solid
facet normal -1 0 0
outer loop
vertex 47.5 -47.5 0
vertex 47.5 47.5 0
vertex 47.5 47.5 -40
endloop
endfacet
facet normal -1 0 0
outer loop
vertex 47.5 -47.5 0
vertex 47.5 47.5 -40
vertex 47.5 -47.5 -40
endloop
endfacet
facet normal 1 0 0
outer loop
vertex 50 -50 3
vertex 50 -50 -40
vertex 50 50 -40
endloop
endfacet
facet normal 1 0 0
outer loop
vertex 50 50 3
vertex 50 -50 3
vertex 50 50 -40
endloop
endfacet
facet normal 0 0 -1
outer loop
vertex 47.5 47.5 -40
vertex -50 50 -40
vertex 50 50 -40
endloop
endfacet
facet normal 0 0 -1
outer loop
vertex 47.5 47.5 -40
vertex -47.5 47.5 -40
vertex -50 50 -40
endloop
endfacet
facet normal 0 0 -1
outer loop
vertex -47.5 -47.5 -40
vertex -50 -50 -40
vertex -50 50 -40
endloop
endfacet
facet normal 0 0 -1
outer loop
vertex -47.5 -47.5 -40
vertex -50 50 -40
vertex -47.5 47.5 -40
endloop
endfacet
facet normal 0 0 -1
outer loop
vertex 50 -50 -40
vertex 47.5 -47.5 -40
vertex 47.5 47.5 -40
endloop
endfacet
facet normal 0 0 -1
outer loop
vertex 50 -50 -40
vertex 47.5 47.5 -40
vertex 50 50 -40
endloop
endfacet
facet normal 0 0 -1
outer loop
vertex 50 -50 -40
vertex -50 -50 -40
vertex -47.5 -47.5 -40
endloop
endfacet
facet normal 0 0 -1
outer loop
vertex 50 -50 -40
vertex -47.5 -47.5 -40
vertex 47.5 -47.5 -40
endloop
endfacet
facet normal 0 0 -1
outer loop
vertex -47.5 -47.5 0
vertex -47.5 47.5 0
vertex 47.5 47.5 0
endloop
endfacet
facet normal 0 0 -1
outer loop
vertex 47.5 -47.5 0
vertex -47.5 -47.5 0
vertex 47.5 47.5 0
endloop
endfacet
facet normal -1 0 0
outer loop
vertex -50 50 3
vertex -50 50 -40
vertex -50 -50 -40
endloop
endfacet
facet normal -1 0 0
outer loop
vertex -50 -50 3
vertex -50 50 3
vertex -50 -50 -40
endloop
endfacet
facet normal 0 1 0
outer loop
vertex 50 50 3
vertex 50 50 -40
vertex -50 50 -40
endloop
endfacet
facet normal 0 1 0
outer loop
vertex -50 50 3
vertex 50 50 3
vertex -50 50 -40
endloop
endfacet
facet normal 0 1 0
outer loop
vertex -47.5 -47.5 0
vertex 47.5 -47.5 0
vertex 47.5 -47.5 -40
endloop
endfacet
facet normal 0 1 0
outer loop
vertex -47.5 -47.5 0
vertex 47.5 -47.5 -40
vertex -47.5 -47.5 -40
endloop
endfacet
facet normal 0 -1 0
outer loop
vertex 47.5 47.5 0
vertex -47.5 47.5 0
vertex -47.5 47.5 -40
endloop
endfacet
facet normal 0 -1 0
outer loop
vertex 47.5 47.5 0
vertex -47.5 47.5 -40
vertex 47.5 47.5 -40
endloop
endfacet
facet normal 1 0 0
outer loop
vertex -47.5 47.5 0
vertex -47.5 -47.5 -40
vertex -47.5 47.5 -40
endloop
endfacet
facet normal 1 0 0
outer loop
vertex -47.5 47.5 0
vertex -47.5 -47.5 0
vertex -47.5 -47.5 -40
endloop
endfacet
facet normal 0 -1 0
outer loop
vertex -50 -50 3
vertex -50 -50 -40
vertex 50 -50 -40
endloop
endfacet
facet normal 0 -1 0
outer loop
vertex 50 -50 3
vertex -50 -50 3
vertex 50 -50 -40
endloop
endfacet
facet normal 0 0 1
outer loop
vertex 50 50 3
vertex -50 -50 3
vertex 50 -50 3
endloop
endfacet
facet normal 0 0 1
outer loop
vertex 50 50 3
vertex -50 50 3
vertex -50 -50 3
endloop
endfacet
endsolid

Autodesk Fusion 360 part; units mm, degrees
sketch "base" plane through (0, 0, 0) normal (0, 0, 1) x (1, 0, 0) in component "base"
  line L0 (50, 50) -> (-50, 50)
  line L1 (-50, 50) -> (-50, -50)
  line L2 (-50, -50) -> (50, -50)
  line L3 (50, -50) -> (50, 50)
  line L4 (50, 50) -> (-50, -50) construction
  line L5 (-50, 50) -> (50, -50) construction
  dimension "d1" = 100
  dimension "d2" = 100
extrude "Extrude1" add sketch "base" along normal blind 3 in component "base"
sketch "legs" plane through (0, 0, 0) normal (0, 0, -1) x (1, 0, 0) in component "base"
  line L0 (50, -50) -> (50, 50)
  line L1 (50, 50) -> (-50, 50)
  line L2 (-50, 50) -> (-50, -50)
  line L3 (-50, -50) -> (50, -50)
  line L4 (47.5, 47.5) -> (-47.5, 47.5)
  line L5 (-47.5, 47.5) -> (-47.5, -47.5)
  line L6 (-47.5, -47.5) -> (47.5, -47.5)
  line L7 (47.5, -47.5) -> (47.5, 47.5)
  line L8 (47.5, 47.5) -> (-47.5, -47.5) construction
  line L9 (-47.5, 47.5) -> (47.5, -47.5) construction
  line L10 (-50, -50) -> (50, -50)
  line L11 (50, -50) -> (50, 50)
  line L12 (50, 50) -> (-50, 50)
  line L13 (-50, 50) -> (-50, -50)
  dimension "d5" = 95
  dimension "d6" = 95
  dimension "d7" = 2.5
extrude "Extrude2" add sketch "legs" along normal blind 40 in component "base"
component "base" placed x (1, 0, 0) y (0, 1, 0) z (0, 0, 1) at (0, 0, 0)
